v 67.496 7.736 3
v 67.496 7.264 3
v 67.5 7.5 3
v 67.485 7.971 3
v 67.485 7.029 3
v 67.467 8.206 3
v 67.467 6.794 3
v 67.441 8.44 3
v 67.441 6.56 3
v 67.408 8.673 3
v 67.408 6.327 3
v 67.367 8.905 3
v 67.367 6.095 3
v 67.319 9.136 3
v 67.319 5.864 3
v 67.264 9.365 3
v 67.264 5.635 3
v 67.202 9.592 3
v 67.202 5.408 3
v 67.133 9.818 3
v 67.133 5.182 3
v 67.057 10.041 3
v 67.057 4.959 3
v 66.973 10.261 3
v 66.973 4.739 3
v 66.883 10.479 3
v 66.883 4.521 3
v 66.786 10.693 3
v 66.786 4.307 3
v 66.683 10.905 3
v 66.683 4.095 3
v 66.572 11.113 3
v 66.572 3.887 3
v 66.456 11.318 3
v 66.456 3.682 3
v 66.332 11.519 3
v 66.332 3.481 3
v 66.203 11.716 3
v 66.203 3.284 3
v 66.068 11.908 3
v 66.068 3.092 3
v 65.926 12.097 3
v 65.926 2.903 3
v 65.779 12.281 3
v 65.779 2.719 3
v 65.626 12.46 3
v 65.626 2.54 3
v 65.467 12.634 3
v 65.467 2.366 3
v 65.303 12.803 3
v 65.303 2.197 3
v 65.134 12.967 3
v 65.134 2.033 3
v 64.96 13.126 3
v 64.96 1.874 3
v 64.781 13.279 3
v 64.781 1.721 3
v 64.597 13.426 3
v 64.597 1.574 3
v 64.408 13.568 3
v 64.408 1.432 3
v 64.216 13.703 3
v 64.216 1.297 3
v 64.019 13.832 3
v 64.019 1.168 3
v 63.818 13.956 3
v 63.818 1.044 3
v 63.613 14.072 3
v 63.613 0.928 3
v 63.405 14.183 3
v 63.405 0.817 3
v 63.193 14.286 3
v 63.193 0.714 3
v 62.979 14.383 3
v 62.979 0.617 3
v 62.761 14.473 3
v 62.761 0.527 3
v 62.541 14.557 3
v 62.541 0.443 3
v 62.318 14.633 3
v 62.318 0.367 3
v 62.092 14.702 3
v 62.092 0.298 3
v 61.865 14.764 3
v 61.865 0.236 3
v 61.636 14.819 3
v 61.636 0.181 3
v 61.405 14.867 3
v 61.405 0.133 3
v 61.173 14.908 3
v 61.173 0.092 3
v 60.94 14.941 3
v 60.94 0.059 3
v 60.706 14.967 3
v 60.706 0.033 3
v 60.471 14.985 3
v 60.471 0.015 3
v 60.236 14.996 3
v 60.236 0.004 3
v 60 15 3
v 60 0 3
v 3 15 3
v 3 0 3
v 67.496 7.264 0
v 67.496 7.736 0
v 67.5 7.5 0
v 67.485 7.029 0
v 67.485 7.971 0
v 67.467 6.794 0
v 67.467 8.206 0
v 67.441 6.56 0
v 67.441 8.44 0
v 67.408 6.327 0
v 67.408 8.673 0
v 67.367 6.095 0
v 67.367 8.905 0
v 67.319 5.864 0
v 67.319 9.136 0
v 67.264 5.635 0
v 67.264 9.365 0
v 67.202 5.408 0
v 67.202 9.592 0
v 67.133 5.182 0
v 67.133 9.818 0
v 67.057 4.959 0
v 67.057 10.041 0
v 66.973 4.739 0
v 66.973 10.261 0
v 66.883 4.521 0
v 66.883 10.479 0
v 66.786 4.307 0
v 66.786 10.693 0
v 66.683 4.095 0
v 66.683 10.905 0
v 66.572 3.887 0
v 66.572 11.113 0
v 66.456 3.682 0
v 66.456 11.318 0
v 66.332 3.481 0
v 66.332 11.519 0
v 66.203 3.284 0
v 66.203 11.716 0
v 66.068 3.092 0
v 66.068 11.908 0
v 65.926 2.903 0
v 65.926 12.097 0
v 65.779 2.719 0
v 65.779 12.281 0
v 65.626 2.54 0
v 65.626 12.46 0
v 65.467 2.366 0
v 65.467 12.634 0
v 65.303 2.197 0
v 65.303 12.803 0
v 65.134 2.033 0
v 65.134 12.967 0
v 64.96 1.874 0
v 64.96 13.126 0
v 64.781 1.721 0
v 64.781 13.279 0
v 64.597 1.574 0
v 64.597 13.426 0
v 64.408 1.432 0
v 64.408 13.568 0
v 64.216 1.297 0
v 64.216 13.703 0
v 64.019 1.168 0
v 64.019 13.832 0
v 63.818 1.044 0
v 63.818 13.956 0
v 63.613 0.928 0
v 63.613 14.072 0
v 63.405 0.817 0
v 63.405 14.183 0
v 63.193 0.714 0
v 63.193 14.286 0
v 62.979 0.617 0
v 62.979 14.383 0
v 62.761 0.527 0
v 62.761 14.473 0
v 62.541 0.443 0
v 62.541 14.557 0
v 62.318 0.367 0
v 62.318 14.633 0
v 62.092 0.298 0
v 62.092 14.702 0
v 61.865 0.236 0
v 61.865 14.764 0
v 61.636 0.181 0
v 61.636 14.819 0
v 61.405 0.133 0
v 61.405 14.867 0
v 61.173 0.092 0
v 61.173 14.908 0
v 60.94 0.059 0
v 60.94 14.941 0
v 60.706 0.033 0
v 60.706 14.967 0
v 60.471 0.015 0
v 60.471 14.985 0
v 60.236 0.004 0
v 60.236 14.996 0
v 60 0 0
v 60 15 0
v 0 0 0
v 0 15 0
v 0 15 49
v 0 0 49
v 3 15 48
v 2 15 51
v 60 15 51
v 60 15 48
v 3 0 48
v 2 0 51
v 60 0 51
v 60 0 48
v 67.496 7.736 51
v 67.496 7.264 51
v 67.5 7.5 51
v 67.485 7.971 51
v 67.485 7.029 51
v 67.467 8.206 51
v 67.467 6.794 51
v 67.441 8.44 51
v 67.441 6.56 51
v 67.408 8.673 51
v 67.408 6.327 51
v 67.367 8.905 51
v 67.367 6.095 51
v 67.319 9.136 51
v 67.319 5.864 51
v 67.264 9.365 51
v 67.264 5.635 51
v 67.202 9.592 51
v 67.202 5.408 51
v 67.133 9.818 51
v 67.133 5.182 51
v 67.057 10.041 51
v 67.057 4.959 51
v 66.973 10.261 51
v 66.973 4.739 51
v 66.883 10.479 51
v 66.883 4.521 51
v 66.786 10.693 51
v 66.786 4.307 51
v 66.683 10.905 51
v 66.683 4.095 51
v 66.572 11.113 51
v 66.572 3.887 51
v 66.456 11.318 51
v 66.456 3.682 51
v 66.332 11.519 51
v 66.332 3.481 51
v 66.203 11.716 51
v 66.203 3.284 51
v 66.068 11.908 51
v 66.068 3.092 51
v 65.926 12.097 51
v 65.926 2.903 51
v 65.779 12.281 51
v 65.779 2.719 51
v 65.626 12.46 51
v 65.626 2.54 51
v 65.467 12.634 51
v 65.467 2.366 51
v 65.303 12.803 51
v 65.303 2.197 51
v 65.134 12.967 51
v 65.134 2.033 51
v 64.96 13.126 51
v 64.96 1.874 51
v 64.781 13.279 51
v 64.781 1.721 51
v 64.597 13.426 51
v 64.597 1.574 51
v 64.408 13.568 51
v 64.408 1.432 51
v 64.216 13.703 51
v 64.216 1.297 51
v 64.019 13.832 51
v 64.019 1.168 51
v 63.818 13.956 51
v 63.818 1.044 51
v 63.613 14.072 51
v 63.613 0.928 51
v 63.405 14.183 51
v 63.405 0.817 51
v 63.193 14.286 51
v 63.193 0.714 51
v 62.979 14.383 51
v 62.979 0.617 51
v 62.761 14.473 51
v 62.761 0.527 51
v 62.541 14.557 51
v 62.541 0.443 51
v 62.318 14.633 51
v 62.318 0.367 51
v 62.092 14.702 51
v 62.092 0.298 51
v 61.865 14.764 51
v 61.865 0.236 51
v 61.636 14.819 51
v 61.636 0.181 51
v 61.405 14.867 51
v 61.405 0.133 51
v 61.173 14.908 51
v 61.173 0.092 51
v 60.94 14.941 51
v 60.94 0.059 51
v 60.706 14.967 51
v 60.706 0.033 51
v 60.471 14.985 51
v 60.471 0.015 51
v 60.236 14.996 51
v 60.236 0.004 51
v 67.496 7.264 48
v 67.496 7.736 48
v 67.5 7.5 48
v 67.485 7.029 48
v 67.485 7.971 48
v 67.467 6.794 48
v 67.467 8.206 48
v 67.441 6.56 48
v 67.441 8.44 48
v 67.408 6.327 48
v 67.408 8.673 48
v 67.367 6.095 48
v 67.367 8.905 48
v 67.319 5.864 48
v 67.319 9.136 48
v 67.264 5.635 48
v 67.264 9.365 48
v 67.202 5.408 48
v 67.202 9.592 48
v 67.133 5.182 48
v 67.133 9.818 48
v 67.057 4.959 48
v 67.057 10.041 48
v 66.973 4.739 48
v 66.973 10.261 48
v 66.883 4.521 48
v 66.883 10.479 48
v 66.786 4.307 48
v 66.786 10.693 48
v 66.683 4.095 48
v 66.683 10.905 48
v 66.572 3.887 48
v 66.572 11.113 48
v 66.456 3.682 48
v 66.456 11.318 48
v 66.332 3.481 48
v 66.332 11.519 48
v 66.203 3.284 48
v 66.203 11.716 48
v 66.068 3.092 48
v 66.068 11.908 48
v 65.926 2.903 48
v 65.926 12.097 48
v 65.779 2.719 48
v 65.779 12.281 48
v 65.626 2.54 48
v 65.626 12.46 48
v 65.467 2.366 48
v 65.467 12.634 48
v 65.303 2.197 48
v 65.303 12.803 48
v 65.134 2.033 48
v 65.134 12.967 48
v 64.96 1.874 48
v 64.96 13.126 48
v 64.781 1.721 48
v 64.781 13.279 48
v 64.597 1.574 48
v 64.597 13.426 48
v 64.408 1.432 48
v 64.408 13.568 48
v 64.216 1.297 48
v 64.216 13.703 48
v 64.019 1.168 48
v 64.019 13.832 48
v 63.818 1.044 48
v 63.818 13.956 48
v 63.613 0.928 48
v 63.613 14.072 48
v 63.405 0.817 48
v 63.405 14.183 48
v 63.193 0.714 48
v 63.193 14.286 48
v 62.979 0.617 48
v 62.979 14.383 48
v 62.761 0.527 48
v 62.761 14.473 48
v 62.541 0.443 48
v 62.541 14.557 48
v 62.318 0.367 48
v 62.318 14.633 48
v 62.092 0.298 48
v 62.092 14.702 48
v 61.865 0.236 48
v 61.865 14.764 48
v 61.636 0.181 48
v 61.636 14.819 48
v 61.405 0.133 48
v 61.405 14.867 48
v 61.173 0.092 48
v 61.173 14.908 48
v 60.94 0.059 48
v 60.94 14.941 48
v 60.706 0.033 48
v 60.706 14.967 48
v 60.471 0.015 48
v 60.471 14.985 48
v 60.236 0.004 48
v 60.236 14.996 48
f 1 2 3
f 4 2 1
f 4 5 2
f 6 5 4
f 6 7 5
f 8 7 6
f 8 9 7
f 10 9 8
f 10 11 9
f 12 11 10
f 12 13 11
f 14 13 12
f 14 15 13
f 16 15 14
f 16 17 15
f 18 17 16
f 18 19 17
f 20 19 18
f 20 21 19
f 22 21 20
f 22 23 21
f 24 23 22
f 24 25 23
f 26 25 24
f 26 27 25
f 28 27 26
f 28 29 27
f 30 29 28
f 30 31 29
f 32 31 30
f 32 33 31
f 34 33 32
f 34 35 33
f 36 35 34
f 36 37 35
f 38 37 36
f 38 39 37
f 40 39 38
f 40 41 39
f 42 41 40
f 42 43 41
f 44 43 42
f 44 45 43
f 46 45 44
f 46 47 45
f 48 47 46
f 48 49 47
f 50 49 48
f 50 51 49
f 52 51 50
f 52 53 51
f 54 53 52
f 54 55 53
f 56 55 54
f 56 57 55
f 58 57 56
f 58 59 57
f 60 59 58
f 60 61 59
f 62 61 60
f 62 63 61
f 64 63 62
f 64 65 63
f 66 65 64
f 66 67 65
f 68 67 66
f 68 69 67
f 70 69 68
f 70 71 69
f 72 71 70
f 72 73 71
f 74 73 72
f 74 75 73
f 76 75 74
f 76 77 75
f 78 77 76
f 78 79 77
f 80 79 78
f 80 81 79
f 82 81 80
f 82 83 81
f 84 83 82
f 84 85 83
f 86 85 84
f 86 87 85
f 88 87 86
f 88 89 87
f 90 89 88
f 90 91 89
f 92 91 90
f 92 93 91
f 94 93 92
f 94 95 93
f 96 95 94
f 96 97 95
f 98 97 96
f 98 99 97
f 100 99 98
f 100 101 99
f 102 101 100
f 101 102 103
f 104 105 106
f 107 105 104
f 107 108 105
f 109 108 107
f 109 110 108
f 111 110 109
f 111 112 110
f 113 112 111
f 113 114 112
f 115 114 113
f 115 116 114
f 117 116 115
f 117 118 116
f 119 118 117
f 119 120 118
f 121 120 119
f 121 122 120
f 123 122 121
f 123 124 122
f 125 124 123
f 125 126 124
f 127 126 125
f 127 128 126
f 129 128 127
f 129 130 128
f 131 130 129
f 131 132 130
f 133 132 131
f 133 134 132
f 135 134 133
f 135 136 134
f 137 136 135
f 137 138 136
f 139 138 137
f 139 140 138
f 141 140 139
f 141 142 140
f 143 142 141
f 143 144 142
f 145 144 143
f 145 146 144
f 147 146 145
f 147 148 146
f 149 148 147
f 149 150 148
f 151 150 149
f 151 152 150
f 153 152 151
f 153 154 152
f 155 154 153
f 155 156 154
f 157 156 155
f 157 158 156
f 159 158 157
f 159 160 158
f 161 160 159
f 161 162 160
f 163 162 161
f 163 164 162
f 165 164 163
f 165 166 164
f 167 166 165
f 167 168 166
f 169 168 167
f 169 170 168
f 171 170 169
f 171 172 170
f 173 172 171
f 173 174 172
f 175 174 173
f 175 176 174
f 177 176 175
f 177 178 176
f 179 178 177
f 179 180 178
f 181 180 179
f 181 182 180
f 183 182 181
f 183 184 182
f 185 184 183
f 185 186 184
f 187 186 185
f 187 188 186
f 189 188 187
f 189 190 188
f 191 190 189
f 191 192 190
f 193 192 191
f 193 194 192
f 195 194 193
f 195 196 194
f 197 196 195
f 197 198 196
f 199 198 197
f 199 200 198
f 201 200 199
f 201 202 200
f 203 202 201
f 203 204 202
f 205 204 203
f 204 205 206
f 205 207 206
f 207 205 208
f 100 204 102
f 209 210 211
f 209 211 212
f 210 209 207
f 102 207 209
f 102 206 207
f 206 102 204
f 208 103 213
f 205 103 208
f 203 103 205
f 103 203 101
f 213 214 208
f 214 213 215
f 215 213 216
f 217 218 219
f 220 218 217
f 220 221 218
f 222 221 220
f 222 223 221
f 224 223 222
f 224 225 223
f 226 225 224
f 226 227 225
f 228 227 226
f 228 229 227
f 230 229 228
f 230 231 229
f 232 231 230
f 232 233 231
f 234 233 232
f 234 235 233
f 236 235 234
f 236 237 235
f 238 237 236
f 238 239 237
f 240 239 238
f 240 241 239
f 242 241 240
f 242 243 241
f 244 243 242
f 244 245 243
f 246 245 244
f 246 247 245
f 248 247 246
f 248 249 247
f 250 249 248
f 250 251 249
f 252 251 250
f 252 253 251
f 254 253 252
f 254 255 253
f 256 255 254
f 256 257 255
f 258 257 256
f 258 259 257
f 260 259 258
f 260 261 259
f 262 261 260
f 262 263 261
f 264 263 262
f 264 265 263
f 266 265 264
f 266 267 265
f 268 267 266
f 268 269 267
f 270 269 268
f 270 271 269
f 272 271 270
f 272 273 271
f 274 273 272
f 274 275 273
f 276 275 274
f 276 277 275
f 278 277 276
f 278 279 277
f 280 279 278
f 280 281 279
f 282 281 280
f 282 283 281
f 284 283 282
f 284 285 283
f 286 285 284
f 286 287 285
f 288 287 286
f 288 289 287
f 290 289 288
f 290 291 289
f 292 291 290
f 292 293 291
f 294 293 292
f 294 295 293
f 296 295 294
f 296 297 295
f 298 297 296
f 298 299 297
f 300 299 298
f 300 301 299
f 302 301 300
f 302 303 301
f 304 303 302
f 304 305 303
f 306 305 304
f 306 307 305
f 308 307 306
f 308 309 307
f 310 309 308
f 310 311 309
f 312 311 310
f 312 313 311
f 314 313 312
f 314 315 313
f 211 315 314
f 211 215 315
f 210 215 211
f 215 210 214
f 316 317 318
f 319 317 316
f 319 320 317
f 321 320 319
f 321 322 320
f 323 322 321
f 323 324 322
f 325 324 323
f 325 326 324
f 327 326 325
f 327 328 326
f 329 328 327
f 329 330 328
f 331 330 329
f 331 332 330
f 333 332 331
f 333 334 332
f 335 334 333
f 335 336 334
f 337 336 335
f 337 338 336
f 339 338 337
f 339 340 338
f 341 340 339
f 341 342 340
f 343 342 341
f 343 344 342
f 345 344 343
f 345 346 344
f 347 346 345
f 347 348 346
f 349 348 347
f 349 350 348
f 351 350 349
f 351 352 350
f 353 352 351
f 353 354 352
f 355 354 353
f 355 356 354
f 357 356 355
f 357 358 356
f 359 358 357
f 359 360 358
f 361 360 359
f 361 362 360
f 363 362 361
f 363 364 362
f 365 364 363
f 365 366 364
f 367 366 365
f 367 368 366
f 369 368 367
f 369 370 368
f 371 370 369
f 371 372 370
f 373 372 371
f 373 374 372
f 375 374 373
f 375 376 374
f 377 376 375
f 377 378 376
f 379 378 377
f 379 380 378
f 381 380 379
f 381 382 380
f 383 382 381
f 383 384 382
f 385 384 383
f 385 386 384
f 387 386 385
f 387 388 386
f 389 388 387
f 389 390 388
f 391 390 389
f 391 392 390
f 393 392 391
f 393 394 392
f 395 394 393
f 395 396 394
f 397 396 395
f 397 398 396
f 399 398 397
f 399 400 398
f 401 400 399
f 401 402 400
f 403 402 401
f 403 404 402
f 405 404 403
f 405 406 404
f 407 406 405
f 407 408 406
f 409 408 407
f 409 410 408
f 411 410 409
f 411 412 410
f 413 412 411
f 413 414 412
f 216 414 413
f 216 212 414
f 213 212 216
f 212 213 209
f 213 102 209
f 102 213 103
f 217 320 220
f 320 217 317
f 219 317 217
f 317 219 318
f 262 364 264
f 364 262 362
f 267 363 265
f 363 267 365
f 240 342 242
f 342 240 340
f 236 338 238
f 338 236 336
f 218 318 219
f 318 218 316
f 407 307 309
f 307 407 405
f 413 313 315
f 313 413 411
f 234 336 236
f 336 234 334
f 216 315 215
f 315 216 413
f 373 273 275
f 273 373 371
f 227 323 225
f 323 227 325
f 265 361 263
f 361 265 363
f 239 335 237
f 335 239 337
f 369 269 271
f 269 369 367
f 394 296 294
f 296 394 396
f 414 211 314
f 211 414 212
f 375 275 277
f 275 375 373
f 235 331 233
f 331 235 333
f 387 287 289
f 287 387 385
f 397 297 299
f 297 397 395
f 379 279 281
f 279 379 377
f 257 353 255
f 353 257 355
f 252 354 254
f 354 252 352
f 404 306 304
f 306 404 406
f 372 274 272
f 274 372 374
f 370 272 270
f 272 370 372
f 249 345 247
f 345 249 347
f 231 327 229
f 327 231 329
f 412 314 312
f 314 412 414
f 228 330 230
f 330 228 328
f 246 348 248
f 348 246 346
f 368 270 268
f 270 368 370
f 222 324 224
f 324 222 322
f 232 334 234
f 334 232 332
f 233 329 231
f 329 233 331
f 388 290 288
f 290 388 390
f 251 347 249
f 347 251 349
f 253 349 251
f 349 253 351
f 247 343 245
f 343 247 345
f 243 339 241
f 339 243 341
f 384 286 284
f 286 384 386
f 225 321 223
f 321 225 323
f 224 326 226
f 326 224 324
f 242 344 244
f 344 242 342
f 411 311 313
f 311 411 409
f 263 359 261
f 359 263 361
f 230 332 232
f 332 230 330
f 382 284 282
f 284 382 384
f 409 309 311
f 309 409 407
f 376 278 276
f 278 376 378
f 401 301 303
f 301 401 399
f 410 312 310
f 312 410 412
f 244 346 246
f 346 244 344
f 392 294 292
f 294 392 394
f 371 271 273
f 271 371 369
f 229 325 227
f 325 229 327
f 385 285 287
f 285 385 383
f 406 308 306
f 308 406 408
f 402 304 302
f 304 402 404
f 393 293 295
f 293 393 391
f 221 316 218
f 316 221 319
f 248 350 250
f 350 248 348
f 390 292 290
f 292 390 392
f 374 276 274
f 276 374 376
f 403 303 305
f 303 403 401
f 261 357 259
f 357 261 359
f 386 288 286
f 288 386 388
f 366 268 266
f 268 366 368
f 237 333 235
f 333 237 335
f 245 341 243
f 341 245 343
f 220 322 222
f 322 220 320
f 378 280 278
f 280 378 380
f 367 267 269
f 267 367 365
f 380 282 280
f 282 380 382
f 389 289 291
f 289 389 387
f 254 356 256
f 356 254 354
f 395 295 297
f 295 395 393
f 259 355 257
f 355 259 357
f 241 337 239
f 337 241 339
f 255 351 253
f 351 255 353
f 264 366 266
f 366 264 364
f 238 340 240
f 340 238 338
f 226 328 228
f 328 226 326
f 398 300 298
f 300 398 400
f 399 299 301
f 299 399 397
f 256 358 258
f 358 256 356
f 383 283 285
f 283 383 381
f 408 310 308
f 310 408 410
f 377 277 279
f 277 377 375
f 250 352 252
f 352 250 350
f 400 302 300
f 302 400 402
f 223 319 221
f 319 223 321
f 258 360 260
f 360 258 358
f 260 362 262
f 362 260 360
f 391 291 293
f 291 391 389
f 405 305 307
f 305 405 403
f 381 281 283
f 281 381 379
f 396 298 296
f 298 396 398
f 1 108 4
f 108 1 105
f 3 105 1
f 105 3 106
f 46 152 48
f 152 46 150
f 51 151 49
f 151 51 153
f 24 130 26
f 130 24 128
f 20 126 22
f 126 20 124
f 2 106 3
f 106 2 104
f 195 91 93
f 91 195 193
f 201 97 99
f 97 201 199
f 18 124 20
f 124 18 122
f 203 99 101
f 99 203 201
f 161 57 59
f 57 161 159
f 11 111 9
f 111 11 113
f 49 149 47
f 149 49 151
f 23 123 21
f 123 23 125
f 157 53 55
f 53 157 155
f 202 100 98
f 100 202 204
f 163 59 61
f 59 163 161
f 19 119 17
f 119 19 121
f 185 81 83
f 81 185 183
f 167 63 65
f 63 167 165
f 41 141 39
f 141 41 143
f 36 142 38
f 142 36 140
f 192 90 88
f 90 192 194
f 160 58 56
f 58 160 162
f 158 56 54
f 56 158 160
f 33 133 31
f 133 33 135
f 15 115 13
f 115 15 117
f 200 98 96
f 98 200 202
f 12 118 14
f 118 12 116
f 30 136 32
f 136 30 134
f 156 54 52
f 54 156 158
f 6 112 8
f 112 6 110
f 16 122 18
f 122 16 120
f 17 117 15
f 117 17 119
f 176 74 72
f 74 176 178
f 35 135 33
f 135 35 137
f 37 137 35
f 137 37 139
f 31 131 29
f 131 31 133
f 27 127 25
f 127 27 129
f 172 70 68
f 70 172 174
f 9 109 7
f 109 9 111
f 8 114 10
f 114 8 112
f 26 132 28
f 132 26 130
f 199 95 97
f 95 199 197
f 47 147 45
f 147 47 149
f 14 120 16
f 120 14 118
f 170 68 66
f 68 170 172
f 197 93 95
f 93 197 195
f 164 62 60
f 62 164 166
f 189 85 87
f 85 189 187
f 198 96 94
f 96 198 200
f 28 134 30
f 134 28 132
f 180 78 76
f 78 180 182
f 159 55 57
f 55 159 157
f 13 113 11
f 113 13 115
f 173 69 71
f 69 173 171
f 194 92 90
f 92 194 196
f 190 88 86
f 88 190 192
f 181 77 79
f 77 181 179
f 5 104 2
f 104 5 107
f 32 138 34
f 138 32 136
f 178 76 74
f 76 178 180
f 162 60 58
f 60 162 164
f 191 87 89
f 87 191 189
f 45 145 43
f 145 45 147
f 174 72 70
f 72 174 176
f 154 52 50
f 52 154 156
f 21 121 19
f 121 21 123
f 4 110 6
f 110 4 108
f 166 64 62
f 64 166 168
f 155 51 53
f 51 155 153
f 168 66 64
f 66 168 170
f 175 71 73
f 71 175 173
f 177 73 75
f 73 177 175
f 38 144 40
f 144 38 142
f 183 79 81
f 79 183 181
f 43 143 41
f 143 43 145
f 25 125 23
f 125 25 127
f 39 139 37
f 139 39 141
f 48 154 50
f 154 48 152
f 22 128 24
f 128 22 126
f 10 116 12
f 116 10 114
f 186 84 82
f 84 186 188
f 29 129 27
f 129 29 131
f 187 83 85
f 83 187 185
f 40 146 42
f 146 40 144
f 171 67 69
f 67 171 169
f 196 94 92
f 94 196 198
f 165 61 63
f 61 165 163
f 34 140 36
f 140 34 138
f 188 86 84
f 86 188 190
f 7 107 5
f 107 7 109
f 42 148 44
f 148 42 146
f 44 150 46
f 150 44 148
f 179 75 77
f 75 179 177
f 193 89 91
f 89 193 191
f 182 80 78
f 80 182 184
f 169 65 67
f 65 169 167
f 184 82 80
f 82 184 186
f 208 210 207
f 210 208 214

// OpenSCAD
thickness = 3;
height = 45;
length = 60;
width = 15;



difference(){
        union(){cube([length,width,thickness]);
translate([0,0,height+thickness]) cube([length,width,thickness]);
cube([thickness,width,height+2*thickness]);
translate([length,width/2,height+thickness]) cylinder(r1=width/2, r2=width/2, h=thickness);
$fn=200;
translate([length,width/2,0]) cylinder(r1=width/2, r2=width/2, h=thickness);
}
        translate([0,0,height+thickness+1]) rotate(a=-45, v=[0,1,0]) cube([50,width,thickness]);
        translate([-7.5,0,1]) rotate(a=45, v=[0,1,0]) cube([50,width,thickness]);
}
